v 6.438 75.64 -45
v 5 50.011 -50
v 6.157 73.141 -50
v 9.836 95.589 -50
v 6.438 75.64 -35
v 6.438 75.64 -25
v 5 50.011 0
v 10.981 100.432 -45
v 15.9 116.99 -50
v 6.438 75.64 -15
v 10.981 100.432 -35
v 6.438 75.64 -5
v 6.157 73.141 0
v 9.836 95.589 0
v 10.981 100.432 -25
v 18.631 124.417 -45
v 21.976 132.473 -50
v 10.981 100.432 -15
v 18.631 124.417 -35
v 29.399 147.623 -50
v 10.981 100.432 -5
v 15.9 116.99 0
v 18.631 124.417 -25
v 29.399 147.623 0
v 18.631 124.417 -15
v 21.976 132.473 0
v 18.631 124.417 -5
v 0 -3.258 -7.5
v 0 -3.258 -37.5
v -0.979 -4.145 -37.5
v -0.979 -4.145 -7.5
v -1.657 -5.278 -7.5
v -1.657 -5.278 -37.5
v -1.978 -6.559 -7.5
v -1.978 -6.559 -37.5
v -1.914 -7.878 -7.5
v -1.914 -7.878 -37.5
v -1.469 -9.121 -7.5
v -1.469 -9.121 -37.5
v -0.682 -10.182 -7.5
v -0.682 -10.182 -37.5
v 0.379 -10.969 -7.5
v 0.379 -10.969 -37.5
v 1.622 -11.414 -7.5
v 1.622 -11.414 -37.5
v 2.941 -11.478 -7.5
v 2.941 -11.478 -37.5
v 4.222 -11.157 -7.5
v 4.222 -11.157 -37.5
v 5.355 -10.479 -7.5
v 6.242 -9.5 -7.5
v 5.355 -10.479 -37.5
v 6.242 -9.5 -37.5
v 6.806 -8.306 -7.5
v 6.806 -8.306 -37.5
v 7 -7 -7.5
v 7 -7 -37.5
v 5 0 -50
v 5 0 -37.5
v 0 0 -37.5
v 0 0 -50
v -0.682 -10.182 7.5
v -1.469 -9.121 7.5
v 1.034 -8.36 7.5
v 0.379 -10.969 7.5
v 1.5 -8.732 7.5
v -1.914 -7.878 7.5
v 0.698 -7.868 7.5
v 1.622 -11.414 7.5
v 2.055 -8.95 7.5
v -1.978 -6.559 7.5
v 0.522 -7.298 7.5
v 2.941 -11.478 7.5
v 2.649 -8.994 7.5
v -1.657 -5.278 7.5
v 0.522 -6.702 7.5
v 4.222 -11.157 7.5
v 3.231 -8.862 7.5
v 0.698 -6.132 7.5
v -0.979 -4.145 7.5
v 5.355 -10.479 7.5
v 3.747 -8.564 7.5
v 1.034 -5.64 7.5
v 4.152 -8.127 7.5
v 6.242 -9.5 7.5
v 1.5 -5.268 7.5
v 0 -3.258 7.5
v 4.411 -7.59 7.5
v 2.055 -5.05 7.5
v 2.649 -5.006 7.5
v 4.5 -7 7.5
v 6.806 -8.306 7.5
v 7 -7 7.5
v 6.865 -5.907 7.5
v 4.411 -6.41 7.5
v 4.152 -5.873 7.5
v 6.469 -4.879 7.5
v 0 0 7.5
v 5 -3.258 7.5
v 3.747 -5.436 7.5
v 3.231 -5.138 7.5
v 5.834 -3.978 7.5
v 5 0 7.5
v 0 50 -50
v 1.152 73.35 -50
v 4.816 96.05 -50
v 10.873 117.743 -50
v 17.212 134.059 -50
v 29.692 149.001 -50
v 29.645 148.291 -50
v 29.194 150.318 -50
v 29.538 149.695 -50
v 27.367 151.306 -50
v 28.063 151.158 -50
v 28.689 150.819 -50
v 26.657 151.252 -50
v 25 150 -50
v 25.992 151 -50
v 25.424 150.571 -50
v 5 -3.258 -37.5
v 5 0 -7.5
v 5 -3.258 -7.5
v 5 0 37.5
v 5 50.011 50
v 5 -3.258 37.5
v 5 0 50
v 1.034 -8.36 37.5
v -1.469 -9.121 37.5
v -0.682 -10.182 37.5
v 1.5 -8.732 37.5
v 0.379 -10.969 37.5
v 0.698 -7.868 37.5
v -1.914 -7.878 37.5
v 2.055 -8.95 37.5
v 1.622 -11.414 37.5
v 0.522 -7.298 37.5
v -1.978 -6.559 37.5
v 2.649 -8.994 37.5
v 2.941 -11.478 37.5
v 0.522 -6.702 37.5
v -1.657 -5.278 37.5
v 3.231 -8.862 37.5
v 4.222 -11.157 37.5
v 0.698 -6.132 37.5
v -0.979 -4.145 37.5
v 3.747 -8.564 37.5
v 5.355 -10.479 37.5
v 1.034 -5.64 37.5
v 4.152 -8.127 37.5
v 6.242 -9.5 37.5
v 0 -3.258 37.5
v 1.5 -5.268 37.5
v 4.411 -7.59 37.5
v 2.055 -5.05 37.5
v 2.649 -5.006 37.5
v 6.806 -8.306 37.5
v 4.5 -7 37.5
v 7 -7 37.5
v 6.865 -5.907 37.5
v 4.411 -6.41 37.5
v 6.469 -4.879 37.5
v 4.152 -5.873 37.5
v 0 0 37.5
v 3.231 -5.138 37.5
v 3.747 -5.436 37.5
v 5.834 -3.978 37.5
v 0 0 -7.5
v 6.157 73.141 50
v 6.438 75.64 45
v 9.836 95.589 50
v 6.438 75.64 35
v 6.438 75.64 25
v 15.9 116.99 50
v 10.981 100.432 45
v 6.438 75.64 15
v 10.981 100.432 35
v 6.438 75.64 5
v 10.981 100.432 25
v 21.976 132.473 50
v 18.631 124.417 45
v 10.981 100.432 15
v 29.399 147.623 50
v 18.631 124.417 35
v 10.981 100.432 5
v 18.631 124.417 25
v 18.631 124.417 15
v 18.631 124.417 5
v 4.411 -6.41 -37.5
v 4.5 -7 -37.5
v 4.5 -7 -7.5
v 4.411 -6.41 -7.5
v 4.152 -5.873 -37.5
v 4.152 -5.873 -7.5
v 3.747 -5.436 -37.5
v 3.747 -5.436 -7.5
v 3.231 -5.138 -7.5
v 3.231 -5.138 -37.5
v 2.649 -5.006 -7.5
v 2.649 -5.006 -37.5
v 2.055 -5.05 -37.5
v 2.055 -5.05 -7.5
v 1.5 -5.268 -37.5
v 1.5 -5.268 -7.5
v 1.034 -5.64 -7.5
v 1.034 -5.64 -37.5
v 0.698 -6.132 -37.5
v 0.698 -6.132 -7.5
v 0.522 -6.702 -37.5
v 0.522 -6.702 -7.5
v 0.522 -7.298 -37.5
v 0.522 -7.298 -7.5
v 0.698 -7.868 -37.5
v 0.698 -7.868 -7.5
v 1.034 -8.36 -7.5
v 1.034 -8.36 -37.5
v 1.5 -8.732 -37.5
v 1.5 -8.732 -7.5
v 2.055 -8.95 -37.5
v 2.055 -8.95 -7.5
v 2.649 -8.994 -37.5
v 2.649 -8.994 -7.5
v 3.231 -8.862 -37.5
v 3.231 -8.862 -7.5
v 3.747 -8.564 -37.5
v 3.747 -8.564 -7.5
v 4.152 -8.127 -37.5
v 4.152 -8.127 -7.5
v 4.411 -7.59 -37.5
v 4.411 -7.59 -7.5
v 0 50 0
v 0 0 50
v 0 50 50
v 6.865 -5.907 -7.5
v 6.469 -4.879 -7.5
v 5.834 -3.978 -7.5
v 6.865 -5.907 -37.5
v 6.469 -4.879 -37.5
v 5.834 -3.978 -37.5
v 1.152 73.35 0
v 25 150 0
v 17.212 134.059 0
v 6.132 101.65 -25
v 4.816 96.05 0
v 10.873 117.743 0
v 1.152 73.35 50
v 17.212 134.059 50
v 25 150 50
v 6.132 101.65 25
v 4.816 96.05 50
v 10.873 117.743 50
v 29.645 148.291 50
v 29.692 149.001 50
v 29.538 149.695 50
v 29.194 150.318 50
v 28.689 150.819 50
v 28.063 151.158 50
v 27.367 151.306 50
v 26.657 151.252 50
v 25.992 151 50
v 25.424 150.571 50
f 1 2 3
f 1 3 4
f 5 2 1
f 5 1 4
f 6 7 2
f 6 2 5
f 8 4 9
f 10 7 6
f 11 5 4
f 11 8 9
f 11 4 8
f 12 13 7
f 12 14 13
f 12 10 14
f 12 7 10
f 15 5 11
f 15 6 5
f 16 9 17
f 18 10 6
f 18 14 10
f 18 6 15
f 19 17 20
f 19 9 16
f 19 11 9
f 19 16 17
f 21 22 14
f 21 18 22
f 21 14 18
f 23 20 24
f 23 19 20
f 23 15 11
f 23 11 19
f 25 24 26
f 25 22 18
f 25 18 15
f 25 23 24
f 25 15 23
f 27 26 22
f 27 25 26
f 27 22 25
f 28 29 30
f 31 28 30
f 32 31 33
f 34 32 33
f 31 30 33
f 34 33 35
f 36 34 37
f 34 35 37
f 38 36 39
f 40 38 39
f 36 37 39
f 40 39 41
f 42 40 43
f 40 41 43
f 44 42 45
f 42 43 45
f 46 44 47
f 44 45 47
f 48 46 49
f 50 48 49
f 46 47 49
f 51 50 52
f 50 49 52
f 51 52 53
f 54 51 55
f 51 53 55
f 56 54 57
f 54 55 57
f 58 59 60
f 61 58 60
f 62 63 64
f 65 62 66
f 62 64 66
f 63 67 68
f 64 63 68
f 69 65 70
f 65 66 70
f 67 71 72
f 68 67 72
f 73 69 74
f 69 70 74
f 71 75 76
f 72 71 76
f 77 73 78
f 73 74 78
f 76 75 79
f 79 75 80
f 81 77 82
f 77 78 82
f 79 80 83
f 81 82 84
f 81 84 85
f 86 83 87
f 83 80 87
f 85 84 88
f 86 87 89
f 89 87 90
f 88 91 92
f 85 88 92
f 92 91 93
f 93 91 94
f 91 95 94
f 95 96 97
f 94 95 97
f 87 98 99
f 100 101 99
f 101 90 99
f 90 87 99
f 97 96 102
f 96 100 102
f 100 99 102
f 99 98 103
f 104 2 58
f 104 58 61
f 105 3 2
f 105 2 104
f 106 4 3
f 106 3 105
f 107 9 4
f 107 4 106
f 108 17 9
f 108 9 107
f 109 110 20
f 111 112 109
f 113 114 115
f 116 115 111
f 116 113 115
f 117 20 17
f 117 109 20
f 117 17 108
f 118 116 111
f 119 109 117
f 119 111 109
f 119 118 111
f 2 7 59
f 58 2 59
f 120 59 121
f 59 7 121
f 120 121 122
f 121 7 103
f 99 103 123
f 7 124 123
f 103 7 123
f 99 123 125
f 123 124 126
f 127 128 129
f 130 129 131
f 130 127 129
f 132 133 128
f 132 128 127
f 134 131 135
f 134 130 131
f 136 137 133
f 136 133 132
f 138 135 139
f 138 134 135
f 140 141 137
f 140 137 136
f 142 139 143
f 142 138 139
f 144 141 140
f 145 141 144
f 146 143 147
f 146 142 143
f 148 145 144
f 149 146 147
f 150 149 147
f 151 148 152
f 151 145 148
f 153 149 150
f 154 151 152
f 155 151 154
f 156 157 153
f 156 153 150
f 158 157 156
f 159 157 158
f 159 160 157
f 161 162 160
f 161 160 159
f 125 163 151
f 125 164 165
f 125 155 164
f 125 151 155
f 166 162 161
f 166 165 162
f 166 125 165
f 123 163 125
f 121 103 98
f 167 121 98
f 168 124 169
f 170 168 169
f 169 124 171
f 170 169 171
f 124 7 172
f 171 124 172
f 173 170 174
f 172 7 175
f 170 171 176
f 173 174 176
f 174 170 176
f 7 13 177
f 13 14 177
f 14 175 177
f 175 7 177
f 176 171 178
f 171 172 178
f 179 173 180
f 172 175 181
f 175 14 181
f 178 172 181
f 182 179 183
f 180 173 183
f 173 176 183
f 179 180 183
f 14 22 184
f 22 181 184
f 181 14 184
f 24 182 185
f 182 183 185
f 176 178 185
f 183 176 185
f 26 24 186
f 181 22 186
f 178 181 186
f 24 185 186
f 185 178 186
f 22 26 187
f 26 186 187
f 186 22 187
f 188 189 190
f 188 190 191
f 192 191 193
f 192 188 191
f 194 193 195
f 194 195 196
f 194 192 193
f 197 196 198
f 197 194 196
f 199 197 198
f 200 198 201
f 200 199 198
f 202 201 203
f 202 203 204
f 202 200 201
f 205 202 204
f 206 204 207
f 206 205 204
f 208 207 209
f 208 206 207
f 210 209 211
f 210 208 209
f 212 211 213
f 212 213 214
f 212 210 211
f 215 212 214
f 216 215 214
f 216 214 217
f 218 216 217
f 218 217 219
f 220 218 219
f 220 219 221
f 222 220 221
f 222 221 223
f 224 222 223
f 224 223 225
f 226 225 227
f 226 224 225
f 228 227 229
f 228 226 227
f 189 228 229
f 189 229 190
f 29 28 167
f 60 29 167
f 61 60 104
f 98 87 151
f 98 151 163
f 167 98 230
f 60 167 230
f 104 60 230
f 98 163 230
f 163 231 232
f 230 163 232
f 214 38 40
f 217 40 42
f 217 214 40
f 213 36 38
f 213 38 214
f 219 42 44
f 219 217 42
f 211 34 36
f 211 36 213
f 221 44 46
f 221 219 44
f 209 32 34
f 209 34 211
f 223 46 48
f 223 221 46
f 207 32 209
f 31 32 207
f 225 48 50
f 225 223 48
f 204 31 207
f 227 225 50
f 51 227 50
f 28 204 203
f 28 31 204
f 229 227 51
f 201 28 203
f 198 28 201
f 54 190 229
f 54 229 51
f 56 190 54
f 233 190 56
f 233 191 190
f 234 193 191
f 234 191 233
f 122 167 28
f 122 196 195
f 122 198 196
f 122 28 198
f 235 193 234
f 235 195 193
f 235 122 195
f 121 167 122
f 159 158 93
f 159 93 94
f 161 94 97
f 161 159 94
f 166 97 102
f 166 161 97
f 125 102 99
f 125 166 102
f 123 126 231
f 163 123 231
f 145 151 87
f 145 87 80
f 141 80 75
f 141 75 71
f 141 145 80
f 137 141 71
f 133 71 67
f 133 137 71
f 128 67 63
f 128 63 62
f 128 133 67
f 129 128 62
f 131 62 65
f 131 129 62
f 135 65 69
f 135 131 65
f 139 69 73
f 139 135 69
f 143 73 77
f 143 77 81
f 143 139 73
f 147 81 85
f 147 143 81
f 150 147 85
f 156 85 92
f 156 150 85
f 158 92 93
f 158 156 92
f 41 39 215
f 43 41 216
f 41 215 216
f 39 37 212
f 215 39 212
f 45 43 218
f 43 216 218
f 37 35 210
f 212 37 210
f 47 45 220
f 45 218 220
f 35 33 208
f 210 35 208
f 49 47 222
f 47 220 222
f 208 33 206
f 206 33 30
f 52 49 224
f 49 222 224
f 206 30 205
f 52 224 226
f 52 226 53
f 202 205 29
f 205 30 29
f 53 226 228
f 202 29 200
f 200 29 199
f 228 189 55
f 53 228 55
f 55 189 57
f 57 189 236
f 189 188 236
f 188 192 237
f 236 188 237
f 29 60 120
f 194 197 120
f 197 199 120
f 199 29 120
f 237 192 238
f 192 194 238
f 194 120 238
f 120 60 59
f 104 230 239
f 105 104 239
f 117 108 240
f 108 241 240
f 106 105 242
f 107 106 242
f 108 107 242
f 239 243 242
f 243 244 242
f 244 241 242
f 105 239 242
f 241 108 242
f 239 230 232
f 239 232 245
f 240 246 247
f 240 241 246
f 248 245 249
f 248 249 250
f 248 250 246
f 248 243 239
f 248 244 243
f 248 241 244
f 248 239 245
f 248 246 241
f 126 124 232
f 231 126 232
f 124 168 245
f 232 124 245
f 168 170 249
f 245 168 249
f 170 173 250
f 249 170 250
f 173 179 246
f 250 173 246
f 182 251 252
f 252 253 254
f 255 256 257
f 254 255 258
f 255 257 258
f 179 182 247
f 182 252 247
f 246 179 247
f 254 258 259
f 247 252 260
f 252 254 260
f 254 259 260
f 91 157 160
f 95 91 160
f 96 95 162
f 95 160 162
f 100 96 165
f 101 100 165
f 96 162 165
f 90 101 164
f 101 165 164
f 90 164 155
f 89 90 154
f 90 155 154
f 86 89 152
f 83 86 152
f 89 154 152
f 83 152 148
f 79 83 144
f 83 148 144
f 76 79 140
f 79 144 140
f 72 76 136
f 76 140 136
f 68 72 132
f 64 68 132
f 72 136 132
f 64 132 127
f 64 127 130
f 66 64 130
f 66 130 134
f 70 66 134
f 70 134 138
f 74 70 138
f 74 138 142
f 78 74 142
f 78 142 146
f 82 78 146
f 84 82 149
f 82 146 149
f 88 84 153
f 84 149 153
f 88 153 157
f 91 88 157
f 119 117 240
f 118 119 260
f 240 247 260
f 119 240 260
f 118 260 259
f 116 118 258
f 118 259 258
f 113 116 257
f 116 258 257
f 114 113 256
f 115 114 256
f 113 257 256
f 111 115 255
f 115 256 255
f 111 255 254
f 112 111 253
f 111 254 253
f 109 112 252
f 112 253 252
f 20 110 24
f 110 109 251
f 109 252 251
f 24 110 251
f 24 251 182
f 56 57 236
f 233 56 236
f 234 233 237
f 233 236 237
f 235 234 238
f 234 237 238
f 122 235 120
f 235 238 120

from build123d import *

# Parameters (mm, degrees)
BOSS_EXTRUDE1_DEPTH = 50
BOSS_EXTRUDE2_START = -12.5
SKETCH2_R           = 2
BOSS_EXTRUDE2_DEPTH = 30


with BuildPart() as part:
    # Sketch1 → Boss-Extrude1 (new body, symmetric)
    with BuildSketch(Plane.XY):
        with BuildLine():
            Line((0, 0), (0, 50))
            add(Edge.make_bspline(
                [(0, 50), (-0.236079675, 103.300249741), (25, 150)],
                knots=[0, 0, 0, 1, 1, 1], degree=2))
            ThreePointArc((25, 150), (28.387941146, 151.010868336), (29.398809482, 147.62292719))
            add(Edge.make_bspline(
                [(5, 50.011073049), (4.990421387, 52.173658537), (5.035623154, 56.511554686), (5.385764781, 65.083196163), (6.308823956, 75.675961605), (8.192566934, 88.173154483), (10.852002898, 100.466008633), (14.287860292, 112.557101091), (18.500659336, 124.449247631), (22.66257211, 134.200371846), (26.379067858, 141.898054896), (28.374986615, 145.728327364), (29.398809482, 147.62292719)],
                knots=[-0.000103873, -0.000103873, -0.000103873, -0.000103873, 0.062402619, 0.124909111, 0.249922095, 0.374935079, 0.499948063, 0.624961048, 0.749974032, 0.874987016, 0.937493508, 1, 1, 1, 1], degree=3))
            Line((5, 50.011073049), (5, 0))
            Line((5, 0), (0, 0))
        make_face()
    extrude(amount=BOSS_EXTRUDE1_DEPTH, both=True)

    # Sketch2 → Boss-Extrude2 (add)
    with BuildSketch(Plane.XY.offset(50).offset(BOSS_EXTRUDE2_START)):
        with BuildLine():
            Line((5, -3.258342613), (0, -3.258342613))
            ThreePointArc((0, -3.258342613), (0.378679656, -10.968626967), (7, -7))
            ThreePointArc((7, -7), (6.468626967, -4.878679656), (5, -3.258342613))
        make_face()
        with Locations((2.5, -7)):
            Circle(SKETCH2_R, mode=Mode.SUBTRACT)
        with BuildLine():
            ThreePointArc((5, -3.258342613), (2.5, -2.5), (0, -3.258342613))
            Line((0, -3.258342613), (5, -3.258342613))
        make_face()
        with BuildLine():
            Line((5, 0), (0, 0))
            Line((0, 0), (0, -3.258342613))
            ThreePointArc((0, -3.258342613), (2.5, -2.5), (5, -3.258342613))
            Line((5, -3.258342613), (5, 0))
        make_face()
    boss_extrude2 = extrude(amount=-BOSS_EXTRUDE2_DEPTH)

    # Mirror1: Boss-Extrude2 across plane
    add(boss_extrude2.mirror(Plane.XY))


solid = part.part
